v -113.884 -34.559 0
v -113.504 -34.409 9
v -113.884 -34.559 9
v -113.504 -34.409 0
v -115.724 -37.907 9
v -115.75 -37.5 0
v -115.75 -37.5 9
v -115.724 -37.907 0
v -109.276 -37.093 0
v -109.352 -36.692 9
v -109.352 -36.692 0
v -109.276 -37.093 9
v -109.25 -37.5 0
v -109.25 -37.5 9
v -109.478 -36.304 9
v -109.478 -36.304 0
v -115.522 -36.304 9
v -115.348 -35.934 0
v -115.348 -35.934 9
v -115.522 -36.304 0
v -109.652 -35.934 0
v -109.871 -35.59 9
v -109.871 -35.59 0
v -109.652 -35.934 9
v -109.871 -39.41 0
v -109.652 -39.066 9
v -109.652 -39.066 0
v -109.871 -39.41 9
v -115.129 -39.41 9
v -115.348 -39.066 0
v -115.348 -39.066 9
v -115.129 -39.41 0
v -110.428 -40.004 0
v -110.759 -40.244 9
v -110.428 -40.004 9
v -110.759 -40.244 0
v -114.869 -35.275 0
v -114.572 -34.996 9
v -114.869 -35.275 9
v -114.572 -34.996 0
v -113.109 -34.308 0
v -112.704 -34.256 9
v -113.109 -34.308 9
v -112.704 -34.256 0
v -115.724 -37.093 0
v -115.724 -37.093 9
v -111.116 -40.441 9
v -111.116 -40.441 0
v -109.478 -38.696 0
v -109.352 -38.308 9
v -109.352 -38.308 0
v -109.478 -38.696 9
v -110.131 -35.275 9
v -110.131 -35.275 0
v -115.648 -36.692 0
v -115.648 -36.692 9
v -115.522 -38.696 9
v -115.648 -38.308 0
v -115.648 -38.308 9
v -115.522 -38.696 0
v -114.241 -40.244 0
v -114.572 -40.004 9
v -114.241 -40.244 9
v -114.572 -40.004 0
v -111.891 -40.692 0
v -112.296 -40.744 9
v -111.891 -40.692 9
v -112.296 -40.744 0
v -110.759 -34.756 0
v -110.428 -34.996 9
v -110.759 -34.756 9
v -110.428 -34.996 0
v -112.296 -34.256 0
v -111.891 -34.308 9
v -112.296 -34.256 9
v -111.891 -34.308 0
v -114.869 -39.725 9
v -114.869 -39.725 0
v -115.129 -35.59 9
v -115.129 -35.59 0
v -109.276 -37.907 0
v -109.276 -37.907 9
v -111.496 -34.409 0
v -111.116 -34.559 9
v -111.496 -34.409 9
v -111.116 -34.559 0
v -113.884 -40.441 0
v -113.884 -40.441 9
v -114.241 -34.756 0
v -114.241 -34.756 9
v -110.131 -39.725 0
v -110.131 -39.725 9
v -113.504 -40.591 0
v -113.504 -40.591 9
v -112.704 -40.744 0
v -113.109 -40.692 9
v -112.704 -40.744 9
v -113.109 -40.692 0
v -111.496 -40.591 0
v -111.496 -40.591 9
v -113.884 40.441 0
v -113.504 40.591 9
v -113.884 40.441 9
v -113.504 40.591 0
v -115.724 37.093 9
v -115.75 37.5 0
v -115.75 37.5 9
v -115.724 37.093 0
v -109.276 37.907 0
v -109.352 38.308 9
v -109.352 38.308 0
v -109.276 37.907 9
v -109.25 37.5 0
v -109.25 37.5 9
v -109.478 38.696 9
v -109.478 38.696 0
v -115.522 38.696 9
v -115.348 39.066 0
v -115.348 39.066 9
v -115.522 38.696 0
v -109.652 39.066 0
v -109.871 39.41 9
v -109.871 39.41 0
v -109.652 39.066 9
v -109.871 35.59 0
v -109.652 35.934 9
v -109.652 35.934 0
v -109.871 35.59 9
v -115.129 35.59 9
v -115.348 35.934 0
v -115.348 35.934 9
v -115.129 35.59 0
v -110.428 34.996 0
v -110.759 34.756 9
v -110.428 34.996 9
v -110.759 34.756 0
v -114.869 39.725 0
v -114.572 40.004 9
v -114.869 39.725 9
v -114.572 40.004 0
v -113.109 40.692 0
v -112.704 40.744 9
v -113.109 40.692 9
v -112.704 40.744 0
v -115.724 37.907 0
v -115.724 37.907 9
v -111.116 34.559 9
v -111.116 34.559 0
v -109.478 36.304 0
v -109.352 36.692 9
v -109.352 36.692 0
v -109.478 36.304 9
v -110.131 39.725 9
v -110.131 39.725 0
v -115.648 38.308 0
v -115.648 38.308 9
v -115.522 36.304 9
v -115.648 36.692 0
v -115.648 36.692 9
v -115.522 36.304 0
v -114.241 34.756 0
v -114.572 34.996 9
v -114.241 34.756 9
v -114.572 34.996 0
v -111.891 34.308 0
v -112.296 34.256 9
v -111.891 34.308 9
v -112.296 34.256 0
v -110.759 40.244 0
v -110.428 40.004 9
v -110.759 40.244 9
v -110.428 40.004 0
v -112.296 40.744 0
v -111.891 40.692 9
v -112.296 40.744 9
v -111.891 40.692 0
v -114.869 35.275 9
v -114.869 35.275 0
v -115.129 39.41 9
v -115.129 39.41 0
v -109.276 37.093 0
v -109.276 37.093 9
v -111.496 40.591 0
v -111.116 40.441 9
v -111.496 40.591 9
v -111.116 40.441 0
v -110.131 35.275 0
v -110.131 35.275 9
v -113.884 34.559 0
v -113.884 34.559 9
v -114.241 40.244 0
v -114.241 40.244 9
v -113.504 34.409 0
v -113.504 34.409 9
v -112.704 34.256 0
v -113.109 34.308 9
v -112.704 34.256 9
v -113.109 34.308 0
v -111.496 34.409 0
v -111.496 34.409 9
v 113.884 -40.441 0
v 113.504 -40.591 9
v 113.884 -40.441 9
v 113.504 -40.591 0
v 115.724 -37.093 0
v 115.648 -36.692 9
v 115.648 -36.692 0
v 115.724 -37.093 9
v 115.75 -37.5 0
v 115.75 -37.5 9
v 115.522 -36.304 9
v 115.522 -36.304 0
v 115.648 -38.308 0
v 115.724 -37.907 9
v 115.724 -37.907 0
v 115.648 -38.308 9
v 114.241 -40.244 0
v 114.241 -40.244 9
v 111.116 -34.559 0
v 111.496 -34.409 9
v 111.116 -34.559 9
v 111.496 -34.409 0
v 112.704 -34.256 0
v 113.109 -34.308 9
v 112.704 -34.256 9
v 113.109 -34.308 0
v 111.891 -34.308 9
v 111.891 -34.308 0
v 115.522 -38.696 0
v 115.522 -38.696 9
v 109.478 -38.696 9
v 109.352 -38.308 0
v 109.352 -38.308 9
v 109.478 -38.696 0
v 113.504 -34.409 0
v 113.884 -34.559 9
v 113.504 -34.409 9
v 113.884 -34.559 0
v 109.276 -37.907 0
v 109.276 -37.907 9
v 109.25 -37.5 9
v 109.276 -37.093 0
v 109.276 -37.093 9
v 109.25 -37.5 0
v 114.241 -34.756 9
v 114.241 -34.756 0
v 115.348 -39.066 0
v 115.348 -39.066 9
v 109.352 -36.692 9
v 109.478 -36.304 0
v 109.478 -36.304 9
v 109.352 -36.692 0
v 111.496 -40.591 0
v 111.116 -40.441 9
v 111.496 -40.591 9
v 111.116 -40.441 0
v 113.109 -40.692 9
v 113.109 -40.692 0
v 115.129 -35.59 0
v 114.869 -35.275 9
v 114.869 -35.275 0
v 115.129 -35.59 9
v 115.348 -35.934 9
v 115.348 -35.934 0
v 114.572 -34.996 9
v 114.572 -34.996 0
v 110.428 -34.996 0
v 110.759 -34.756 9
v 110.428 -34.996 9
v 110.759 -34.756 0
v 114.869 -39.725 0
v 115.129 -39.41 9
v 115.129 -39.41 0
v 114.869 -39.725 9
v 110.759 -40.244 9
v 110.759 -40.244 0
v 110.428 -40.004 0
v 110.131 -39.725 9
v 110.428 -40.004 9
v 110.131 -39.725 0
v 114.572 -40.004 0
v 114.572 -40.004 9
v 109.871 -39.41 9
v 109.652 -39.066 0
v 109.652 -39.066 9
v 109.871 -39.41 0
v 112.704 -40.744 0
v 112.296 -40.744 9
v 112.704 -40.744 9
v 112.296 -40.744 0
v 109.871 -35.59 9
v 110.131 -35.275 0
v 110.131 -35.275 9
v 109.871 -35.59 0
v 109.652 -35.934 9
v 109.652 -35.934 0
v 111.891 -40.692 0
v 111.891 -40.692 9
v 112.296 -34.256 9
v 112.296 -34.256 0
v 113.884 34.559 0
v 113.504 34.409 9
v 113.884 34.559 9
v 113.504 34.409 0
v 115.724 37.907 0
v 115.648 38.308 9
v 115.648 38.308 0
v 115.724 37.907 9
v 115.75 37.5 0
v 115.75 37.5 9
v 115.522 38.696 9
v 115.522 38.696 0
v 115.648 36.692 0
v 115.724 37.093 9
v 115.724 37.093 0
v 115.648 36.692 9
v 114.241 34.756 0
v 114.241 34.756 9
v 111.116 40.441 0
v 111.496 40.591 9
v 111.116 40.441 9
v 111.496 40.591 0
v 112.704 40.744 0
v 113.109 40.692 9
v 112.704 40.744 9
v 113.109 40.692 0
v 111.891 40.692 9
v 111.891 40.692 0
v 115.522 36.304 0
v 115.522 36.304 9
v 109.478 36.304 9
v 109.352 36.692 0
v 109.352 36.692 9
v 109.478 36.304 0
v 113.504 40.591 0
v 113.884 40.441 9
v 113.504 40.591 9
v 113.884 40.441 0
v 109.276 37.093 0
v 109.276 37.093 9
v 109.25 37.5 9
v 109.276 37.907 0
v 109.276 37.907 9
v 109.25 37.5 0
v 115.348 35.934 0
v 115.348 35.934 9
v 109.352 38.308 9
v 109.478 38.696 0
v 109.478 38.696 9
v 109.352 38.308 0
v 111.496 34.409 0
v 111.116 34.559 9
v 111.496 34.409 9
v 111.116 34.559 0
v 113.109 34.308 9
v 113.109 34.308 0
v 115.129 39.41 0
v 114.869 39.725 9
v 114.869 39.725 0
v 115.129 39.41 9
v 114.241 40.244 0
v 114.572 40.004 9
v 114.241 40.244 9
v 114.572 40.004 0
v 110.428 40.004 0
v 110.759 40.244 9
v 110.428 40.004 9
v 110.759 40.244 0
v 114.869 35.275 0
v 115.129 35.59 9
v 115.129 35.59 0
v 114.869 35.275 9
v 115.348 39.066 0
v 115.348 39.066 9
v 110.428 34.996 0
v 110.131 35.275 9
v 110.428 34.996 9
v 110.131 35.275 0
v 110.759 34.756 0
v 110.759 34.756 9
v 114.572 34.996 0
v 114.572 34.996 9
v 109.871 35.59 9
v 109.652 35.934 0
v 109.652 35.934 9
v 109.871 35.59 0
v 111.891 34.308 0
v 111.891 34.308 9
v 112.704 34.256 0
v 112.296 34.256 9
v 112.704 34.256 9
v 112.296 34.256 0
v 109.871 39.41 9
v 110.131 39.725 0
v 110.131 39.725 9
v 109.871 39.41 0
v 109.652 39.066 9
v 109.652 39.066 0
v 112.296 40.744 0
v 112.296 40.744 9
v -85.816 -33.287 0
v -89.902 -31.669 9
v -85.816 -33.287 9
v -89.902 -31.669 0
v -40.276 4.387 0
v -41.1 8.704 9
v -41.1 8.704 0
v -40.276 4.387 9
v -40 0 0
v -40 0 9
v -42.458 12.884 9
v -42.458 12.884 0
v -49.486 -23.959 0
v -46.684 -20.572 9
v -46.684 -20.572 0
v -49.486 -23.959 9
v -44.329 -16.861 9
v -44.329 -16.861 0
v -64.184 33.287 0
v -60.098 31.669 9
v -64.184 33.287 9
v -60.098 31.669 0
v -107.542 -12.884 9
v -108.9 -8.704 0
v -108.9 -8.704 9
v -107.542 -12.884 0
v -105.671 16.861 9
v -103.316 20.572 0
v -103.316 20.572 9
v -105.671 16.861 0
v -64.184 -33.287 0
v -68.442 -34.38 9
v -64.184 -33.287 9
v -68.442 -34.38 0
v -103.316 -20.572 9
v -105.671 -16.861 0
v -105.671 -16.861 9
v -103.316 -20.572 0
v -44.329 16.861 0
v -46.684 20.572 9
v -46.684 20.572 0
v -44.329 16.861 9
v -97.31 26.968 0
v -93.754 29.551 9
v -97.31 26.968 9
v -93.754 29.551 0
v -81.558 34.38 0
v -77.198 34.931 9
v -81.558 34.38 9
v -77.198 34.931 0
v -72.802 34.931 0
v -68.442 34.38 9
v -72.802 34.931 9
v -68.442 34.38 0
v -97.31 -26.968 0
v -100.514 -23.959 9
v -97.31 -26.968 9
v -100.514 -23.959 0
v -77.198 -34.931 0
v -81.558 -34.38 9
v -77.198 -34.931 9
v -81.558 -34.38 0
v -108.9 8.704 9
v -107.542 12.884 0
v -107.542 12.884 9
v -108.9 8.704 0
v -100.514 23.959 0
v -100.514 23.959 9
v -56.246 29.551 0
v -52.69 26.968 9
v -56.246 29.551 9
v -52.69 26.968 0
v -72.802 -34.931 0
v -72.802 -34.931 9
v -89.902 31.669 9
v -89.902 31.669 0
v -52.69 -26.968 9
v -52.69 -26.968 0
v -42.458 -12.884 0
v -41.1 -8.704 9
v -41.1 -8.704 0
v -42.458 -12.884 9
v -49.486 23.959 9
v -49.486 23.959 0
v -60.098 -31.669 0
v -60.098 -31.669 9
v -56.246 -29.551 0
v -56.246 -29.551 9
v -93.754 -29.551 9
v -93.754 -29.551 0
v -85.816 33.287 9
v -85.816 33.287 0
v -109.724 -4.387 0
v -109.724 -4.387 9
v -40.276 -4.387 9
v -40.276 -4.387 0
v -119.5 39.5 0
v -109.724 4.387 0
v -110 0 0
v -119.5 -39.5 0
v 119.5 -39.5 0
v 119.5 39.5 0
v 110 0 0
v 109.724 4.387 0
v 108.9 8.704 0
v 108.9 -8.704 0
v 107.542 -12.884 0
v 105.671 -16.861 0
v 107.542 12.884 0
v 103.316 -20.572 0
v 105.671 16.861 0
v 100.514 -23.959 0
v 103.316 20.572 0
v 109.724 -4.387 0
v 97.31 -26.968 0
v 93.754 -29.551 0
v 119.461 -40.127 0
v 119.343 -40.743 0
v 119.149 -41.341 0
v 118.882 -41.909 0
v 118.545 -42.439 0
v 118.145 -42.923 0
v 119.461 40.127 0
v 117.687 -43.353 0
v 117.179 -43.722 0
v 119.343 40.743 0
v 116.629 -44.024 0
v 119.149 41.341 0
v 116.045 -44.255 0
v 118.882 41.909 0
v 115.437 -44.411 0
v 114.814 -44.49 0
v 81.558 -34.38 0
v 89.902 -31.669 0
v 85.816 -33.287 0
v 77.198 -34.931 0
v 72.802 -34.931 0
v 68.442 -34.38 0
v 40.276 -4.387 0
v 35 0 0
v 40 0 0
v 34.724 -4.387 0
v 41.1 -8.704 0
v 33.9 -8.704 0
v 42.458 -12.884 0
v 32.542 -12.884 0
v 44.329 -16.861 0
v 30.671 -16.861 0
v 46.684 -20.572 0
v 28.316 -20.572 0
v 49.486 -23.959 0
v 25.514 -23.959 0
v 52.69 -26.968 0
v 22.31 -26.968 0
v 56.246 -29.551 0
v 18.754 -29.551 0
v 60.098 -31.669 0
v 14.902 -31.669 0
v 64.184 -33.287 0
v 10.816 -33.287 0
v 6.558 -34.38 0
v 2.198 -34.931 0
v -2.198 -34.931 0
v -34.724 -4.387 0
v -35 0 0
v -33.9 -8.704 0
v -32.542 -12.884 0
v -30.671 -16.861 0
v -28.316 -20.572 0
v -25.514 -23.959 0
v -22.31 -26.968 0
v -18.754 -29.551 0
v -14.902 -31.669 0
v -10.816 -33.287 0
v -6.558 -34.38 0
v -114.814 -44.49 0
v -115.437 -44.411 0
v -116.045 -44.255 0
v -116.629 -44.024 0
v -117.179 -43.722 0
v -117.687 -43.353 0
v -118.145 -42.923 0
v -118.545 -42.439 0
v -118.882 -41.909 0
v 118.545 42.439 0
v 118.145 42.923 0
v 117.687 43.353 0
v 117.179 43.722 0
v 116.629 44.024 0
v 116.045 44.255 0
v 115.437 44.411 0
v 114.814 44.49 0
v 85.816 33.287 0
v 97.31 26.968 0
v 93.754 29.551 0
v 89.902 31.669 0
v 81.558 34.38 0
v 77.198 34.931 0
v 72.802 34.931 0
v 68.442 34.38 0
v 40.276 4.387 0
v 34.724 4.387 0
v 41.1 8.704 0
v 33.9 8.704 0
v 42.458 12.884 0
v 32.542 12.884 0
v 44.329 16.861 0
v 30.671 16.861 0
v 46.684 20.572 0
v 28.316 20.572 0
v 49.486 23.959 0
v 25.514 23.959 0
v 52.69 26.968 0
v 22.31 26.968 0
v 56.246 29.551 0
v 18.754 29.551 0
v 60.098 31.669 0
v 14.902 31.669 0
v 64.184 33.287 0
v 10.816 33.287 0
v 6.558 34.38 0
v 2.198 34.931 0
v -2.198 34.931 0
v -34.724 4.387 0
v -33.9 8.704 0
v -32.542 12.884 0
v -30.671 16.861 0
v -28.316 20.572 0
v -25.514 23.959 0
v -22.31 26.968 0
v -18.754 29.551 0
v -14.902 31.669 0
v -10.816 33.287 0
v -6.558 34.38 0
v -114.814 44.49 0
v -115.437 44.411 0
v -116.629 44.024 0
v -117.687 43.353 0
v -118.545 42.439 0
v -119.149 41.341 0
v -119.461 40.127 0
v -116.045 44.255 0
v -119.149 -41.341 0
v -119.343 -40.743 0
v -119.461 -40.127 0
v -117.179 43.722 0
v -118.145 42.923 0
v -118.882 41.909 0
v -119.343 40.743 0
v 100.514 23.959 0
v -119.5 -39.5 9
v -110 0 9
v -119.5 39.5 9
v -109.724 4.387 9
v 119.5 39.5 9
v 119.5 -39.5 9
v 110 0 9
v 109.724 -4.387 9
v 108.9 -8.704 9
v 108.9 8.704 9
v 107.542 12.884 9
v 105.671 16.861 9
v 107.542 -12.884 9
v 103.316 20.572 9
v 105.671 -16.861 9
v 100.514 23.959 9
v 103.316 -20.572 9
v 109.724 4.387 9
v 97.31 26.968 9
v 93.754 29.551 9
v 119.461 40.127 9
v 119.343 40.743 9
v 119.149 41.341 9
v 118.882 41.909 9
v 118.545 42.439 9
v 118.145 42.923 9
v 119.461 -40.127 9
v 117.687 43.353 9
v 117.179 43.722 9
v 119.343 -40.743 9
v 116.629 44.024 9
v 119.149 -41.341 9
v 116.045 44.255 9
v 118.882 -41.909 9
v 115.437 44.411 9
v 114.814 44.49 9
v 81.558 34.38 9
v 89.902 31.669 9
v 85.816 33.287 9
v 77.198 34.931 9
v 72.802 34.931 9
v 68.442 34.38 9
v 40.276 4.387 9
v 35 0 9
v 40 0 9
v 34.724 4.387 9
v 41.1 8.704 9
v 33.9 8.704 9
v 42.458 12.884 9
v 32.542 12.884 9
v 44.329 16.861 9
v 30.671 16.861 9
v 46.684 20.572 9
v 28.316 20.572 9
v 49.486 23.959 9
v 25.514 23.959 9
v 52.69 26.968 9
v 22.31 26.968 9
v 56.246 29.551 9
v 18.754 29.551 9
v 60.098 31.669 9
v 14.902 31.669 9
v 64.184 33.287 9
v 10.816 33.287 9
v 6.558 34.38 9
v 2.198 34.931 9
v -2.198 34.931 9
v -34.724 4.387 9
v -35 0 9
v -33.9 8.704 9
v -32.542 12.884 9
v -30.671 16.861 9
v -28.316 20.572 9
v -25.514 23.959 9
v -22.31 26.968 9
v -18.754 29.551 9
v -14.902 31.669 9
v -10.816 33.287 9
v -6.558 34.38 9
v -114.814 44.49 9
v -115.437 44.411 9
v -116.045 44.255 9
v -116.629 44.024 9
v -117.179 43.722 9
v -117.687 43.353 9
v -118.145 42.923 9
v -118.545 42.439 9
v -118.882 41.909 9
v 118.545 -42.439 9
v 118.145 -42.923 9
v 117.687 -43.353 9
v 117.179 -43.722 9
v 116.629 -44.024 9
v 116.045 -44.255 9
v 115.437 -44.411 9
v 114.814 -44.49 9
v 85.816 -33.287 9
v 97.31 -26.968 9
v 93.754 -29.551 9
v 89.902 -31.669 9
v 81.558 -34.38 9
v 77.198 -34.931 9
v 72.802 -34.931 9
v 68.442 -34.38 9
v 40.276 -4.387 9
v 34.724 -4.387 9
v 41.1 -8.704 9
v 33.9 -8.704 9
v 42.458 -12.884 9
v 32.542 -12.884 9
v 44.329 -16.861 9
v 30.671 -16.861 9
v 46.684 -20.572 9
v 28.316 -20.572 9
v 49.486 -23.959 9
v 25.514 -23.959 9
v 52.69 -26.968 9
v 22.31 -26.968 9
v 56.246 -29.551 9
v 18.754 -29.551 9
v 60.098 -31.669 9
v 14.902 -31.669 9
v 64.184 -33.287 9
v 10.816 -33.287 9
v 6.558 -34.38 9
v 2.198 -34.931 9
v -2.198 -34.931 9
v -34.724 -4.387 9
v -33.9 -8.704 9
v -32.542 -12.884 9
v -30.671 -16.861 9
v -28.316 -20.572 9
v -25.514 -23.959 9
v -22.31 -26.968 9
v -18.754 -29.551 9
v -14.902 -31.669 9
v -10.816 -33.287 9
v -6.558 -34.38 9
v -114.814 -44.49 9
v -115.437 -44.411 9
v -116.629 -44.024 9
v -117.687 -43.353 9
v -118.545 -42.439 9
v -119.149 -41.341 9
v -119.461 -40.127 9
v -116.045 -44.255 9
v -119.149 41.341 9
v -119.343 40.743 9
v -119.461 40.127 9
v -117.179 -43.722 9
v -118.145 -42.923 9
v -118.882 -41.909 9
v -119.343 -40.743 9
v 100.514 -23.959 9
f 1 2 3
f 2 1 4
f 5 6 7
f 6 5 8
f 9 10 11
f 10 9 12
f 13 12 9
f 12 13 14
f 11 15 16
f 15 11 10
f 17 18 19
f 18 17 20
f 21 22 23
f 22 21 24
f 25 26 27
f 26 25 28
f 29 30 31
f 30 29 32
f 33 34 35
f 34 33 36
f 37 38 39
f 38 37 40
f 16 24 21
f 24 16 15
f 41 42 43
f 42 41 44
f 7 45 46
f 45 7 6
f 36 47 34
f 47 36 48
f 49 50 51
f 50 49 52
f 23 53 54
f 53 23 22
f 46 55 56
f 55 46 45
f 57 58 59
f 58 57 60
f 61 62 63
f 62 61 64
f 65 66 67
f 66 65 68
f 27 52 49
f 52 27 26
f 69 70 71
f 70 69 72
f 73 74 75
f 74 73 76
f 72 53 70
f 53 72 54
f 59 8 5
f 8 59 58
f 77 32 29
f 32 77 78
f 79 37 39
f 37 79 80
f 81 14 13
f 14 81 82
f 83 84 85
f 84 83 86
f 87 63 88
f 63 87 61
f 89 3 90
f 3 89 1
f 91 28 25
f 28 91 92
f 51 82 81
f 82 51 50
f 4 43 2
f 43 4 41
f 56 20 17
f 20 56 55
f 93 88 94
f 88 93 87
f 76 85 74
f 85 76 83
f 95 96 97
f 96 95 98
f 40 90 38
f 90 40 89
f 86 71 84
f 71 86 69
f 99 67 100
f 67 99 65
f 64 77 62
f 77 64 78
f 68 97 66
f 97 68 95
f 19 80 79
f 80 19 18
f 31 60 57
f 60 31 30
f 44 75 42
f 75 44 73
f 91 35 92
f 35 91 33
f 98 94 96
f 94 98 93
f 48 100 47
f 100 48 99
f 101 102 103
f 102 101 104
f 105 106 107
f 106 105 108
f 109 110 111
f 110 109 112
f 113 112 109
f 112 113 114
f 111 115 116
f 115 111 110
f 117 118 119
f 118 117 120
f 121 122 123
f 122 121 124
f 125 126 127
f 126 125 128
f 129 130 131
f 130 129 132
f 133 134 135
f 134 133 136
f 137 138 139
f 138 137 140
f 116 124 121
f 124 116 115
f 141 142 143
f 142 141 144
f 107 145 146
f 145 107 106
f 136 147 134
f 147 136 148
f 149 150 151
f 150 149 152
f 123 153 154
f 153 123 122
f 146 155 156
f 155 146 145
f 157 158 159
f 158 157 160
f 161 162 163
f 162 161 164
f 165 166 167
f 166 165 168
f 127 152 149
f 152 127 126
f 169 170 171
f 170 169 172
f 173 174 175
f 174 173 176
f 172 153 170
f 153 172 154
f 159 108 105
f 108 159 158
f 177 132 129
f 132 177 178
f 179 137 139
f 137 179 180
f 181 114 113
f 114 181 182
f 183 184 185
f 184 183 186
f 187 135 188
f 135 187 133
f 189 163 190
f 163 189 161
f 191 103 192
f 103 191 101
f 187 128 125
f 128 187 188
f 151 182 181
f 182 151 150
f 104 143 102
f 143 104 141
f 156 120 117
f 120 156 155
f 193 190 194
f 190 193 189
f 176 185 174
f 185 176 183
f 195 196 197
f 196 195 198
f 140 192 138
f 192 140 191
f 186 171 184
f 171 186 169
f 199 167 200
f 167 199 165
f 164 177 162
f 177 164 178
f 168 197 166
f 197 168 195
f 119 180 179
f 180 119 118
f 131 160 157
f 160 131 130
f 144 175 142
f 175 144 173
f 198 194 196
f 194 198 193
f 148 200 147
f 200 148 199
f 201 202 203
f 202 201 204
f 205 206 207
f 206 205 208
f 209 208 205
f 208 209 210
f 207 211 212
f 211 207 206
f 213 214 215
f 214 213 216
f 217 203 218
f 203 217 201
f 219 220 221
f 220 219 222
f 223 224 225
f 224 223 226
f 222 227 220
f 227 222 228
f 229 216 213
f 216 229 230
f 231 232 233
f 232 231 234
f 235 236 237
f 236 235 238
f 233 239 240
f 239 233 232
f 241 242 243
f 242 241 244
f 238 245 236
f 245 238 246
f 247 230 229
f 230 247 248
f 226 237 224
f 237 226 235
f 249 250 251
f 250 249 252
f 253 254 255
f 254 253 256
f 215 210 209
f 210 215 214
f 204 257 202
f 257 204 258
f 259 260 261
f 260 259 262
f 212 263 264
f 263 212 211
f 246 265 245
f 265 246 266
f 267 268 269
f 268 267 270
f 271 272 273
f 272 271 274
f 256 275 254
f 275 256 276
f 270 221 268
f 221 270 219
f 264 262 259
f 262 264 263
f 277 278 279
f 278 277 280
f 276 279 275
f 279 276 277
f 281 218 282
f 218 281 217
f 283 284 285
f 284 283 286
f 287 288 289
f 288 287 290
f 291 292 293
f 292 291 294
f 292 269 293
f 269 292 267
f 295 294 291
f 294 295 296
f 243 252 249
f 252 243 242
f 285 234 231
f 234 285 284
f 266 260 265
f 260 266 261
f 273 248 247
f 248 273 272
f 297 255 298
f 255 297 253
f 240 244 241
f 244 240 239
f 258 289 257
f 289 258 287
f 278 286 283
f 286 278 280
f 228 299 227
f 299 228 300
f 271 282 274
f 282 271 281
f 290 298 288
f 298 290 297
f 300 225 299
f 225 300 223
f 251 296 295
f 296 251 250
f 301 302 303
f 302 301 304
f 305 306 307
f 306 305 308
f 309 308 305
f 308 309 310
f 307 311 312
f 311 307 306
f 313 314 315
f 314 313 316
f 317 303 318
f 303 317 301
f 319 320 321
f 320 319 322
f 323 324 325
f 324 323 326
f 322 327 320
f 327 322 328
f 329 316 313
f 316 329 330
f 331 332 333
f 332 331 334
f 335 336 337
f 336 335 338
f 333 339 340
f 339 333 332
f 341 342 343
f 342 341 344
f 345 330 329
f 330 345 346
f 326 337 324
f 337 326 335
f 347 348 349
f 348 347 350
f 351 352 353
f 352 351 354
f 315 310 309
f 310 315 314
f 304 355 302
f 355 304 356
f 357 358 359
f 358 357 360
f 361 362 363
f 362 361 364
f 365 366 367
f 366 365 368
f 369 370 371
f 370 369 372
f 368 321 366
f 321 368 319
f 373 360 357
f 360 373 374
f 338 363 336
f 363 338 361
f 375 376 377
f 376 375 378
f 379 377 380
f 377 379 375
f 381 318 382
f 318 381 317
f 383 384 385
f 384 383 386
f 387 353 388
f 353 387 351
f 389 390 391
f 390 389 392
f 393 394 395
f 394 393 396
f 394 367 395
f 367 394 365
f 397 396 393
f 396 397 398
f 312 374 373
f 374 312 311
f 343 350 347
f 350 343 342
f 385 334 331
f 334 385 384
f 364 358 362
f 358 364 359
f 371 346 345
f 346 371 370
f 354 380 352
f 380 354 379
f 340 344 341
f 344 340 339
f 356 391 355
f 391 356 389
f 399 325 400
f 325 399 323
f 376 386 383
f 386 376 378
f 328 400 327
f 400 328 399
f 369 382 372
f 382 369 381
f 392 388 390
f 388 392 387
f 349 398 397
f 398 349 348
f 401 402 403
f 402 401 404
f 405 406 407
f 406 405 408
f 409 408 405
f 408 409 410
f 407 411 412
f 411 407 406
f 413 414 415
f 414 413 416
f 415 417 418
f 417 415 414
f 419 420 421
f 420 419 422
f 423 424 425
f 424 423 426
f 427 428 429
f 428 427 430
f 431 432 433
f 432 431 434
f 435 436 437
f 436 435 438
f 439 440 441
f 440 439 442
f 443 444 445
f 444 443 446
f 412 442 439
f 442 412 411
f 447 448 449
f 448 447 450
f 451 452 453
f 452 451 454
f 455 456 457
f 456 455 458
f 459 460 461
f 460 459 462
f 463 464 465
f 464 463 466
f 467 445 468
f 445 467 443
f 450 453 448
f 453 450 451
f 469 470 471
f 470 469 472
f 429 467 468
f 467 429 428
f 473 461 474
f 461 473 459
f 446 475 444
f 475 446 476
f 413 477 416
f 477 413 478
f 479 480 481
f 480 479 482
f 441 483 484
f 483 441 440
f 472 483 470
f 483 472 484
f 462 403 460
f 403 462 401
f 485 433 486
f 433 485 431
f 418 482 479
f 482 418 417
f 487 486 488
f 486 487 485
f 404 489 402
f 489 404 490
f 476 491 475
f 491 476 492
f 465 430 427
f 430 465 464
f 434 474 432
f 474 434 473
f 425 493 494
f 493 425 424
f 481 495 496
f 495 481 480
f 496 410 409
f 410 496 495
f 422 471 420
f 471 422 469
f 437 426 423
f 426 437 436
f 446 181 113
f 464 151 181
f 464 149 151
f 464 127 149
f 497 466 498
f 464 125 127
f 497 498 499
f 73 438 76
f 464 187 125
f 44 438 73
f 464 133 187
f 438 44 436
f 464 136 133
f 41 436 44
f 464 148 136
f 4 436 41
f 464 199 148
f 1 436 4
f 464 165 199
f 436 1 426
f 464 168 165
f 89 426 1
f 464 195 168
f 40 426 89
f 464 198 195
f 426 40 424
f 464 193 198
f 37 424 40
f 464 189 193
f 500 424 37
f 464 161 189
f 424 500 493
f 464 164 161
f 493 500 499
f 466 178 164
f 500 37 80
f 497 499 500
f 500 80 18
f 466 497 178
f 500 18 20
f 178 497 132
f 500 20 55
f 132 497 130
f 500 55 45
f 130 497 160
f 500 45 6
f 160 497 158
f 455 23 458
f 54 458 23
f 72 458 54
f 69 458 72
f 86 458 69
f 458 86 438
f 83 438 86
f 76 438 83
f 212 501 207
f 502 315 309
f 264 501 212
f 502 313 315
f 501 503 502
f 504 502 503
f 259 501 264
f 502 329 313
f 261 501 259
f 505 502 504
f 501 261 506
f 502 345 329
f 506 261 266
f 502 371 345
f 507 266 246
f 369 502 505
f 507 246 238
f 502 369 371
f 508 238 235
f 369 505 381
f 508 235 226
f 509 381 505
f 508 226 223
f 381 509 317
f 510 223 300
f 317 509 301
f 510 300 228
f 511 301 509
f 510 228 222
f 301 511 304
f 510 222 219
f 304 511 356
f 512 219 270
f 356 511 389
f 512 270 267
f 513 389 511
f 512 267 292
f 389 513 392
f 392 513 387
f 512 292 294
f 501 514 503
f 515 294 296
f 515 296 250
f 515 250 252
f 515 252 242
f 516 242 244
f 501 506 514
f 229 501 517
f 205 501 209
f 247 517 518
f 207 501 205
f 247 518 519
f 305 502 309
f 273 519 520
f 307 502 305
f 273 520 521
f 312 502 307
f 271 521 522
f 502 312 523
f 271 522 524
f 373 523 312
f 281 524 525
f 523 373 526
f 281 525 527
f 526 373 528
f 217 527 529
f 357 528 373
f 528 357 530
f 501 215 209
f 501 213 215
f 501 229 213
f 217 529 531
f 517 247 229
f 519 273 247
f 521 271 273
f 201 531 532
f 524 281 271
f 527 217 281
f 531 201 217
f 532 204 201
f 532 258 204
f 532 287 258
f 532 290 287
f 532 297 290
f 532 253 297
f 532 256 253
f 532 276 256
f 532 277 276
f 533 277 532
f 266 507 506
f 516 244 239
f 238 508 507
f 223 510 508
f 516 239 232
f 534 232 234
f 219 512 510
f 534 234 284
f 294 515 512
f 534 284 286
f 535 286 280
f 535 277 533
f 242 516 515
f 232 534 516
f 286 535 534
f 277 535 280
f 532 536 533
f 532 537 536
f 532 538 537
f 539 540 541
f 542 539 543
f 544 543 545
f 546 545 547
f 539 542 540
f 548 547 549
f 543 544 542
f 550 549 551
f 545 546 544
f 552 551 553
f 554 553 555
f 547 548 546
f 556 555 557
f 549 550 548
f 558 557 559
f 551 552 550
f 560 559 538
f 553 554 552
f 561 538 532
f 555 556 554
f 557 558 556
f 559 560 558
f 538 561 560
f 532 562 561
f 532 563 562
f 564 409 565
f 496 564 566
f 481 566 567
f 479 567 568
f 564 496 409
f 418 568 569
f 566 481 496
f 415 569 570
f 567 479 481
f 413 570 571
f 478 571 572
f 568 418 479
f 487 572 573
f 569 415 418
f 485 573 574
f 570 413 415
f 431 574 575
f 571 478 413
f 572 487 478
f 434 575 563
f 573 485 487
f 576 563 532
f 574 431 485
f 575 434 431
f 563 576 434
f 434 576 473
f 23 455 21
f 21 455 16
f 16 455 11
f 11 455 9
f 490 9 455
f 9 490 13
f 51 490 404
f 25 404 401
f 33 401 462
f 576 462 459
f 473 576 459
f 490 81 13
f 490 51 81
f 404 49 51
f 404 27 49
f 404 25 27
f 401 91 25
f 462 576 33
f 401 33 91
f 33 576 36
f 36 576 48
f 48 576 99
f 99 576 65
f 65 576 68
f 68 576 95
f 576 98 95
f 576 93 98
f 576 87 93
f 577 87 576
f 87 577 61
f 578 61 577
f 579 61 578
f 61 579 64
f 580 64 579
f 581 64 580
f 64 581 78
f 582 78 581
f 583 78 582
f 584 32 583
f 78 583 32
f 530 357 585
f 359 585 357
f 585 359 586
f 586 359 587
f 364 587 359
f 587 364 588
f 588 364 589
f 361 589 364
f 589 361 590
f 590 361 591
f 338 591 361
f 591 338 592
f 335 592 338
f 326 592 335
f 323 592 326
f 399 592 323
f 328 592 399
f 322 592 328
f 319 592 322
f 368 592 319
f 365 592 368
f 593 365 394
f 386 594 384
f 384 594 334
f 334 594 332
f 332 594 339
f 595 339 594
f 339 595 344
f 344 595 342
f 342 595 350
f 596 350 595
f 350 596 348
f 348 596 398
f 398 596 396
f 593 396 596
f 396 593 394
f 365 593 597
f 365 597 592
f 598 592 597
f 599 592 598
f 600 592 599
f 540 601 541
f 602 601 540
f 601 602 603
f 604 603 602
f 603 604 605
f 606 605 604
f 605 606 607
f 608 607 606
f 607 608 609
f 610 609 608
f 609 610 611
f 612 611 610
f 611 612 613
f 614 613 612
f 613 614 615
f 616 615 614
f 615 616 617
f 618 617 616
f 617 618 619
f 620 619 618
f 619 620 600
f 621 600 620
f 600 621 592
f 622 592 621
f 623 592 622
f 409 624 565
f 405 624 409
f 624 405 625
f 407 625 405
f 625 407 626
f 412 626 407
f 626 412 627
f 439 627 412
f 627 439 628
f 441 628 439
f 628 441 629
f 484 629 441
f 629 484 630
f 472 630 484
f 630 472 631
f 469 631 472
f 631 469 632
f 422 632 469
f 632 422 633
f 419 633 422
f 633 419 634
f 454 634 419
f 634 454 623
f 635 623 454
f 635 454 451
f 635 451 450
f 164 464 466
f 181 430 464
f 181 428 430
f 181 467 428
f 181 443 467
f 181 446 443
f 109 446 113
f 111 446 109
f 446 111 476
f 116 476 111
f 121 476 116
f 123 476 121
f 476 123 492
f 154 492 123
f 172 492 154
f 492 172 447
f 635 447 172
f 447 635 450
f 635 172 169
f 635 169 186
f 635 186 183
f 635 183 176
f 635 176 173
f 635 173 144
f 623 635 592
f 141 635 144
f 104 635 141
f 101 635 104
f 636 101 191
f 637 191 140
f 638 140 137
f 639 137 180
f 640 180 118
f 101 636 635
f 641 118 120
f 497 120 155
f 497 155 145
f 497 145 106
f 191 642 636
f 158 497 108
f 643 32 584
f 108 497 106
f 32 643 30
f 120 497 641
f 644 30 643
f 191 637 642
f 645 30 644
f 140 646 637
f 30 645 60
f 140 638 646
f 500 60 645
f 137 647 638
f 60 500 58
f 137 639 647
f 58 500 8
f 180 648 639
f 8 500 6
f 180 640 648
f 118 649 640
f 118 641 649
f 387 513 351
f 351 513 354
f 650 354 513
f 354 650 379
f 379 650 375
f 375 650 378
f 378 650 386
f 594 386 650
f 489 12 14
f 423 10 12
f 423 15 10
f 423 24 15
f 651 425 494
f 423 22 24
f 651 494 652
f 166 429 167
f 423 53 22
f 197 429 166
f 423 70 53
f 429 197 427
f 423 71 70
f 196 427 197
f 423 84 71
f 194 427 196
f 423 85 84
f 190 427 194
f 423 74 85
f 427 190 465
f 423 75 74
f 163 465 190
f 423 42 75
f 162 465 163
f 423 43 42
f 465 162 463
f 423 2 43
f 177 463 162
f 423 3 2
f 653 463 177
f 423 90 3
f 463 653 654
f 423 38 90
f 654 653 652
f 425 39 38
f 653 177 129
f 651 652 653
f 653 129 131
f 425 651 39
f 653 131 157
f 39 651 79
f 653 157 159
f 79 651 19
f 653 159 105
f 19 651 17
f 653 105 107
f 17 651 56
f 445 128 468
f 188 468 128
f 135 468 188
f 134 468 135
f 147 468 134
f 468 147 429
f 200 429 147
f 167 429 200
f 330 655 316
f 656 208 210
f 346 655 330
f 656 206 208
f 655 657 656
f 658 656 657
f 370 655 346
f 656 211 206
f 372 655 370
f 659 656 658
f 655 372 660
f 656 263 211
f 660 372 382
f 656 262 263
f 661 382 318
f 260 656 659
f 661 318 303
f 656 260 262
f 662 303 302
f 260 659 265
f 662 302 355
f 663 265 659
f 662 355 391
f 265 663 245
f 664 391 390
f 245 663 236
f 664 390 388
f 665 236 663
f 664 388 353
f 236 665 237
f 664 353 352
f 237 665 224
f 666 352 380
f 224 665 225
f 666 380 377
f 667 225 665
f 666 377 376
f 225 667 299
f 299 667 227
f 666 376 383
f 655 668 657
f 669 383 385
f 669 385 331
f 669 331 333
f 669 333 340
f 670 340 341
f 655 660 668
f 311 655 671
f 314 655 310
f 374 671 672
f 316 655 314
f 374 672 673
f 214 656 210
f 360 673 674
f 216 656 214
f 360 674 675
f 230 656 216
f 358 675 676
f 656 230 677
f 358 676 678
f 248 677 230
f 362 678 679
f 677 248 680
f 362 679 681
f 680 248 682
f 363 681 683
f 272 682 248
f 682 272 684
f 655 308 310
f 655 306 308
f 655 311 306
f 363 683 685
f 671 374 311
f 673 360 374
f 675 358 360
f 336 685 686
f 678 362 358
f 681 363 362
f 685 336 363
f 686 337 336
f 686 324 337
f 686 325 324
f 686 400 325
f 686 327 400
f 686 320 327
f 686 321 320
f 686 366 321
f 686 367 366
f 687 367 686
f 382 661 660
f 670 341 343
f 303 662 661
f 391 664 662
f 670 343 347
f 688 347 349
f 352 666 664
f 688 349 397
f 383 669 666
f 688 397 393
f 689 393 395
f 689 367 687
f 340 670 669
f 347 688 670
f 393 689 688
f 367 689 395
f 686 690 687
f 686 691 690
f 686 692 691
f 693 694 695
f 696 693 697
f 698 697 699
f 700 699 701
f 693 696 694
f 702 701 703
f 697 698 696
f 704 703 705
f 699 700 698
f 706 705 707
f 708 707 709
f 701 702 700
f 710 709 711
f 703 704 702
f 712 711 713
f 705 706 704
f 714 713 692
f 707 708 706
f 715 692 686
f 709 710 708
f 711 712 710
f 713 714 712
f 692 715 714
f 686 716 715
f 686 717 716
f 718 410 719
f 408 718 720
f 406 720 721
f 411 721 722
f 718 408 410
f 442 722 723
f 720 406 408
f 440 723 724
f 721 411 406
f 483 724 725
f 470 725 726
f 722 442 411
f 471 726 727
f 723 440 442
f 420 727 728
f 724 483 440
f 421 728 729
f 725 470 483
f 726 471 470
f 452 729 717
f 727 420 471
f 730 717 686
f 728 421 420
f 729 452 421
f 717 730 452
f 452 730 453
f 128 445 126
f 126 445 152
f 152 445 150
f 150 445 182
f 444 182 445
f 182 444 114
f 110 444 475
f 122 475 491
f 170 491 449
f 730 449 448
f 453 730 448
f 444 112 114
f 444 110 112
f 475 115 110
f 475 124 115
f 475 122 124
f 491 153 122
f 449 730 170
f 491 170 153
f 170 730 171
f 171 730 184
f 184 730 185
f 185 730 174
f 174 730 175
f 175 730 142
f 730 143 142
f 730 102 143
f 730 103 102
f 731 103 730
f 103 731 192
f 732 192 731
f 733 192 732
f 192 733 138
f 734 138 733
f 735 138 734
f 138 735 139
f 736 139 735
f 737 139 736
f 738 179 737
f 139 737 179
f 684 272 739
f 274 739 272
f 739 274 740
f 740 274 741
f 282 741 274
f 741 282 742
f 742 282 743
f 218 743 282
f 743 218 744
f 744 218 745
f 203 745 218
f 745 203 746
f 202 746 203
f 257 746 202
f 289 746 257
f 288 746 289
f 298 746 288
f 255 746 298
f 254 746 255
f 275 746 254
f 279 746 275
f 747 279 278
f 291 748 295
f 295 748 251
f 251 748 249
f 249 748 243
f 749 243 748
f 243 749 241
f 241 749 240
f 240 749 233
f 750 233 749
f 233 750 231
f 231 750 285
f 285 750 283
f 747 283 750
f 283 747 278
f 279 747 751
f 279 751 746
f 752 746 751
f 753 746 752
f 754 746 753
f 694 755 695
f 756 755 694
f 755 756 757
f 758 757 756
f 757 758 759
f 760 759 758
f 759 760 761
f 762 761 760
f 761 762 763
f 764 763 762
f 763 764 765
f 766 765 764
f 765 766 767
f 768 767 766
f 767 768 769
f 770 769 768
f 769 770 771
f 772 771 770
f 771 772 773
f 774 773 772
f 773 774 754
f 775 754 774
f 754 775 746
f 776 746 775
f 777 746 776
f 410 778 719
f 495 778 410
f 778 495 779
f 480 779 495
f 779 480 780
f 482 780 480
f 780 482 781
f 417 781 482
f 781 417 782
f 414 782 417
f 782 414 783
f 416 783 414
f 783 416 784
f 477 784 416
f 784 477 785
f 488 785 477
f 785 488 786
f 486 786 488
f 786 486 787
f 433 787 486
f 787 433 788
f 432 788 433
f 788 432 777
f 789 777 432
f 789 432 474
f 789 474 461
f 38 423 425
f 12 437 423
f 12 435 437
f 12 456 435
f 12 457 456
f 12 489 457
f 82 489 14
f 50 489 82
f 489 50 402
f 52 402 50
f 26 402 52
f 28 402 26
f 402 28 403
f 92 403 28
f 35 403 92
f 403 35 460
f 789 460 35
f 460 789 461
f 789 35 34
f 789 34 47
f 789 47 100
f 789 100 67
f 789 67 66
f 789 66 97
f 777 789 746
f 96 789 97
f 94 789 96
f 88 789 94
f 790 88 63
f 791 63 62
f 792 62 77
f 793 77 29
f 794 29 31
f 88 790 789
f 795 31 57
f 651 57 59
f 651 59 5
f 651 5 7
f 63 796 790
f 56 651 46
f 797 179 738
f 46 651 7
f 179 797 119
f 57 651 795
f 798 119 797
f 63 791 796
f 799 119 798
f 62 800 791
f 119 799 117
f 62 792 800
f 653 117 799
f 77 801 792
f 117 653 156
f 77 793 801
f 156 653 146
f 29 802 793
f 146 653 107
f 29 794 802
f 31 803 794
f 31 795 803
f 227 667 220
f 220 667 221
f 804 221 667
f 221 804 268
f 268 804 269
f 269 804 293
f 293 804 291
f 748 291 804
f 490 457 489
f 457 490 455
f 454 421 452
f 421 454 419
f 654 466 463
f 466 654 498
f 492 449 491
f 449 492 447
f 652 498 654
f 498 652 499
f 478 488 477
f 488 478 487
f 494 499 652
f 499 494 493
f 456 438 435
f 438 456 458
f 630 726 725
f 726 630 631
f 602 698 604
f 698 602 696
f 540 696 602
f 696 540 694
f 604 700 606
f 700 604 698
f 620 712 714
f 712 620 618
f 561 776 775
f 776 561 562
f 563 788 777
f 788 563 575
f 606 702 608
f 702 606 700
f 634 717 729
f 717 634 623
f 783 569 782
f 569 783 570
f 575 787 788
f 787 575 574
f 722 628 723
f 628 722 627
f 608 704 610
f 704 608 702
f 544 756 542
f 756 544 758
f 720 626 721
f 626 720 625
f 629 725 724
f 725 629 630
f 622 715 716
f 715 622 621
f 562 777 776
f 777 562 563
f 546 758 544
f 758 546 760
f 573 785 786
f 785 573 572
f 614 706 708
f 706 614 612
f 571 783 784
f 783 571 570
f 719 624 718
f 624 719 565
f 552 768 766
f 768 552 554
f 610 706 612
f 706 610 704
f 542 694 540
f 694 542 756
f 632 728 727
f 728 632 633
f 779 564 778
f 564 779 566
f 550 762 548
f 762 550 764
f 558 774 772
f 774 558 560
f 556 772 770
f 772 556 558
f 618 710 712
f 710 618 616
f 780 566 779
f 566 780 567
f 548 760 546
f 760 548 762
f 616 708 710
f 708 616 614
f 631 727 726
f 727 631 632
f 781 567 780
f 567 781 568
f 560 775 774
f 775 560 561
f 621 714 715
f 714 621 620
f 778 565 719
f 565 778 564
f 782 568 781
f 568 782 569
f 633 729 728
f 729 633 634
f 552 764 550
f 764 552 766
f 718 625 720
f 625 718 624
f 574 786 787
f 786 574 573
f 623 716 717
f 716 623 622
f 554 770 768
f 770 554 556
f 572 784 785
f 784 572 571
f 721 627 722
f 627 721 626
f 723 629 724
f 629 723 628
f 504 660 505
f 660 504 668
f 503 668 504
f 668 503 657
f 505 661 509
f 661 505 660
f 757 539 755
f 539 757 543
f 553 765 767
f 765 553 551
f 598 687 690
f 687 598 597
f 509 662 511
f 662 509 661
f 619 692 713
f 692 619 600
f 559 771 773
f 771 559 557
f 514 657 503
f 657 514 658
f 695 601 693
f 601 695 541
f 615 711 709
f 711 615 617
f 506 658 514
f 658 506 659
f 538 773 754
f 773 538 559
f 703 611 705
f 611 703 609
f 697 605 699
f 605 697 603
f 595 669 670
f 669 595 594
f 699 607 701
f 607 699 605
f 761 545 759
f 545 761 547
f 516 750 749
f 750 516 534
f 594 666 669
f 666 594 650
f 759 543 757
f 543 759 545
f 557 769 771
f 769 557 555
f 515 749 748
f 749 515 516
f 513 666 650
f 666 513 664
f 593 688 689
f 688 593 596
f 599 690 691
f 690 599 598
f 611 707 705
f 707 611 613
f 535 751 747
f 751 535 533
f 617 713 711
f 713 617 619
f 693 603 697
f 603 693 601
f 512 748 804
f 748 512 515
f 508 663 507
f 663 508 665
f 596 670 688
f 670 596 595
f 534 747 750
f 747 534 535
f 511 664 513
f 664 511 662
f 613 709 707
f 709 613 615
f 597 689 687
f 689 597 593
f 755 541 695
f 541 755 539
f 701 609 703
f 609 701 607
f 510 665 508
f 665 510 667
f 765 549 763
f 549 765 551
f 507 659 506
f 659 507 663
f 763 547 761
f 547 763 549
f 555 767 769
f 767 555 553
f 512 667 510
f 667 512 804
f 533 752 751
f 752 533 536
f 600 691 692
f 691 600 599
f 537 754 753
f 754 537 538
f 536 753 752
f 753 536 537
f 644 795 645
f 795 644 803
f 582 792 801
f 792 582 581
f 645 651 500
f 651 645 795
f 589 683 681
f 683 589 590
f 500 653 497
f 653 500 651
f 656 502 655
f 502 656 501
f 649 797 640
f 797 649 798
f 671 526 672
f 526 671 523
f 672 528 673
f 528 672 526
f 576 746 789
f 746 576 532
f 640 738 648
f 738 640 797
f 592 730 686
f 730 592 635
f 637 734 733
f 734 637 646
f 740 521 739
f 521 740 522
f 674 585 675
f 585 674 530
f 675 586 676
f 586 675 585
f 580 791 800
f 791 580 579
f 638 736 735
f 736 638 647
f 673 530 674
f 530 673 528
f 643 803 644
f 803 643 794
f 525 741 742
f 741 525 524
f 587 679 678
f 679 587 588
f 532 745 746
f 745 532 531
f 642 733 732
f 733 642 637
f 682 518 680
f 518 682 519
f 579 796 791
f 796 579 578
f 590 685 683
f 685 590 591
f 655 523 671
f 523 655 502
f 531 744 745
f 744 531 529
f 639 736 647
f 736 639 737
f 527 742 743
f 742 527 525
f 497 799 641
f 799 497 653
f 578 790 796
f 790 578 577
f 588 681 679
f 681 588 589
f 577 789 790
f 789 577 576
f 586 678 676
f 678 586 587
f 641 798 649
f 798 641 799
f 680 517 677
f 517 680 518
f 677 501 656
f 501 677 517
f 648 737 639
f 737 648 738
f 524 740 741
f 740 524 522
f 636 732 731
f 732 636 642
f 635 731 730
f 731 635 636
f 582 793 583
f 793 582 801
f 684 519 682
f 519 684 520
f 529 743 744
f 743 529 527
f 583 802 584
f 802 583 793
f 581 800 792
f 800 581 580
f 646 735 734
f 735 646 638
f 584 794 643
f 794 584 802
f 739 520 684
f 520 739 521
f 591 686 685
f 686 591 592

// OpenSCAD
$fn = 50;


difference() {
	union() {
		hull() {
			translate(v = [-114.5000000000, 39.5000000000, 0]) {
				cylinder(h = 9, r = 5);
			}
			translate(v = [114.5000000000, 39.5000000000, 0]) {
				cylinder(h = 9, r = 5);
			}
			translate(v = [-114.5000000000, -39.5000000000, 0]) {
				cylinder(h = 9, r = 5);
			}
			translate(v = [114.5000000000, -39.5000000000, 0]) {
				cylinder(h = 9, r = 5);
			}
		}
	}
	union() {
		#translate(v = [-112.5000000000, -37.5000000000, -100.0000000000]) {
			cylinder(h = 200, r = 3.2500000000);
		}
		#translate(v = [-112.5000000000, 37.5000000000, -100.0000000000]) {
			cylinder(h = 200, r = 3.2500000000);
		}
		#translate(v = [112.5000000000, -37.5000000000, -100.0000000000]) {
			cylinder(h = 200, r = 3.2500000000);
		}
		#translate(v = [112.5000000000, 37.5000000000, -100.0000000000]) {
			cylinder(h = 200, r = 3.2500000000);
		}
		#translate(v = [-75.0000000000, 0, 0]) {
			cylinder(h = 9, r = 35.0000000000);
		}
		#cylinder(h = 9, r = 35.0000000000);
		#translate(v = [75.0000000000, 0, 0]) {
			cylinder(h = 9, r = 35.0000000000);
		}
	}
}
